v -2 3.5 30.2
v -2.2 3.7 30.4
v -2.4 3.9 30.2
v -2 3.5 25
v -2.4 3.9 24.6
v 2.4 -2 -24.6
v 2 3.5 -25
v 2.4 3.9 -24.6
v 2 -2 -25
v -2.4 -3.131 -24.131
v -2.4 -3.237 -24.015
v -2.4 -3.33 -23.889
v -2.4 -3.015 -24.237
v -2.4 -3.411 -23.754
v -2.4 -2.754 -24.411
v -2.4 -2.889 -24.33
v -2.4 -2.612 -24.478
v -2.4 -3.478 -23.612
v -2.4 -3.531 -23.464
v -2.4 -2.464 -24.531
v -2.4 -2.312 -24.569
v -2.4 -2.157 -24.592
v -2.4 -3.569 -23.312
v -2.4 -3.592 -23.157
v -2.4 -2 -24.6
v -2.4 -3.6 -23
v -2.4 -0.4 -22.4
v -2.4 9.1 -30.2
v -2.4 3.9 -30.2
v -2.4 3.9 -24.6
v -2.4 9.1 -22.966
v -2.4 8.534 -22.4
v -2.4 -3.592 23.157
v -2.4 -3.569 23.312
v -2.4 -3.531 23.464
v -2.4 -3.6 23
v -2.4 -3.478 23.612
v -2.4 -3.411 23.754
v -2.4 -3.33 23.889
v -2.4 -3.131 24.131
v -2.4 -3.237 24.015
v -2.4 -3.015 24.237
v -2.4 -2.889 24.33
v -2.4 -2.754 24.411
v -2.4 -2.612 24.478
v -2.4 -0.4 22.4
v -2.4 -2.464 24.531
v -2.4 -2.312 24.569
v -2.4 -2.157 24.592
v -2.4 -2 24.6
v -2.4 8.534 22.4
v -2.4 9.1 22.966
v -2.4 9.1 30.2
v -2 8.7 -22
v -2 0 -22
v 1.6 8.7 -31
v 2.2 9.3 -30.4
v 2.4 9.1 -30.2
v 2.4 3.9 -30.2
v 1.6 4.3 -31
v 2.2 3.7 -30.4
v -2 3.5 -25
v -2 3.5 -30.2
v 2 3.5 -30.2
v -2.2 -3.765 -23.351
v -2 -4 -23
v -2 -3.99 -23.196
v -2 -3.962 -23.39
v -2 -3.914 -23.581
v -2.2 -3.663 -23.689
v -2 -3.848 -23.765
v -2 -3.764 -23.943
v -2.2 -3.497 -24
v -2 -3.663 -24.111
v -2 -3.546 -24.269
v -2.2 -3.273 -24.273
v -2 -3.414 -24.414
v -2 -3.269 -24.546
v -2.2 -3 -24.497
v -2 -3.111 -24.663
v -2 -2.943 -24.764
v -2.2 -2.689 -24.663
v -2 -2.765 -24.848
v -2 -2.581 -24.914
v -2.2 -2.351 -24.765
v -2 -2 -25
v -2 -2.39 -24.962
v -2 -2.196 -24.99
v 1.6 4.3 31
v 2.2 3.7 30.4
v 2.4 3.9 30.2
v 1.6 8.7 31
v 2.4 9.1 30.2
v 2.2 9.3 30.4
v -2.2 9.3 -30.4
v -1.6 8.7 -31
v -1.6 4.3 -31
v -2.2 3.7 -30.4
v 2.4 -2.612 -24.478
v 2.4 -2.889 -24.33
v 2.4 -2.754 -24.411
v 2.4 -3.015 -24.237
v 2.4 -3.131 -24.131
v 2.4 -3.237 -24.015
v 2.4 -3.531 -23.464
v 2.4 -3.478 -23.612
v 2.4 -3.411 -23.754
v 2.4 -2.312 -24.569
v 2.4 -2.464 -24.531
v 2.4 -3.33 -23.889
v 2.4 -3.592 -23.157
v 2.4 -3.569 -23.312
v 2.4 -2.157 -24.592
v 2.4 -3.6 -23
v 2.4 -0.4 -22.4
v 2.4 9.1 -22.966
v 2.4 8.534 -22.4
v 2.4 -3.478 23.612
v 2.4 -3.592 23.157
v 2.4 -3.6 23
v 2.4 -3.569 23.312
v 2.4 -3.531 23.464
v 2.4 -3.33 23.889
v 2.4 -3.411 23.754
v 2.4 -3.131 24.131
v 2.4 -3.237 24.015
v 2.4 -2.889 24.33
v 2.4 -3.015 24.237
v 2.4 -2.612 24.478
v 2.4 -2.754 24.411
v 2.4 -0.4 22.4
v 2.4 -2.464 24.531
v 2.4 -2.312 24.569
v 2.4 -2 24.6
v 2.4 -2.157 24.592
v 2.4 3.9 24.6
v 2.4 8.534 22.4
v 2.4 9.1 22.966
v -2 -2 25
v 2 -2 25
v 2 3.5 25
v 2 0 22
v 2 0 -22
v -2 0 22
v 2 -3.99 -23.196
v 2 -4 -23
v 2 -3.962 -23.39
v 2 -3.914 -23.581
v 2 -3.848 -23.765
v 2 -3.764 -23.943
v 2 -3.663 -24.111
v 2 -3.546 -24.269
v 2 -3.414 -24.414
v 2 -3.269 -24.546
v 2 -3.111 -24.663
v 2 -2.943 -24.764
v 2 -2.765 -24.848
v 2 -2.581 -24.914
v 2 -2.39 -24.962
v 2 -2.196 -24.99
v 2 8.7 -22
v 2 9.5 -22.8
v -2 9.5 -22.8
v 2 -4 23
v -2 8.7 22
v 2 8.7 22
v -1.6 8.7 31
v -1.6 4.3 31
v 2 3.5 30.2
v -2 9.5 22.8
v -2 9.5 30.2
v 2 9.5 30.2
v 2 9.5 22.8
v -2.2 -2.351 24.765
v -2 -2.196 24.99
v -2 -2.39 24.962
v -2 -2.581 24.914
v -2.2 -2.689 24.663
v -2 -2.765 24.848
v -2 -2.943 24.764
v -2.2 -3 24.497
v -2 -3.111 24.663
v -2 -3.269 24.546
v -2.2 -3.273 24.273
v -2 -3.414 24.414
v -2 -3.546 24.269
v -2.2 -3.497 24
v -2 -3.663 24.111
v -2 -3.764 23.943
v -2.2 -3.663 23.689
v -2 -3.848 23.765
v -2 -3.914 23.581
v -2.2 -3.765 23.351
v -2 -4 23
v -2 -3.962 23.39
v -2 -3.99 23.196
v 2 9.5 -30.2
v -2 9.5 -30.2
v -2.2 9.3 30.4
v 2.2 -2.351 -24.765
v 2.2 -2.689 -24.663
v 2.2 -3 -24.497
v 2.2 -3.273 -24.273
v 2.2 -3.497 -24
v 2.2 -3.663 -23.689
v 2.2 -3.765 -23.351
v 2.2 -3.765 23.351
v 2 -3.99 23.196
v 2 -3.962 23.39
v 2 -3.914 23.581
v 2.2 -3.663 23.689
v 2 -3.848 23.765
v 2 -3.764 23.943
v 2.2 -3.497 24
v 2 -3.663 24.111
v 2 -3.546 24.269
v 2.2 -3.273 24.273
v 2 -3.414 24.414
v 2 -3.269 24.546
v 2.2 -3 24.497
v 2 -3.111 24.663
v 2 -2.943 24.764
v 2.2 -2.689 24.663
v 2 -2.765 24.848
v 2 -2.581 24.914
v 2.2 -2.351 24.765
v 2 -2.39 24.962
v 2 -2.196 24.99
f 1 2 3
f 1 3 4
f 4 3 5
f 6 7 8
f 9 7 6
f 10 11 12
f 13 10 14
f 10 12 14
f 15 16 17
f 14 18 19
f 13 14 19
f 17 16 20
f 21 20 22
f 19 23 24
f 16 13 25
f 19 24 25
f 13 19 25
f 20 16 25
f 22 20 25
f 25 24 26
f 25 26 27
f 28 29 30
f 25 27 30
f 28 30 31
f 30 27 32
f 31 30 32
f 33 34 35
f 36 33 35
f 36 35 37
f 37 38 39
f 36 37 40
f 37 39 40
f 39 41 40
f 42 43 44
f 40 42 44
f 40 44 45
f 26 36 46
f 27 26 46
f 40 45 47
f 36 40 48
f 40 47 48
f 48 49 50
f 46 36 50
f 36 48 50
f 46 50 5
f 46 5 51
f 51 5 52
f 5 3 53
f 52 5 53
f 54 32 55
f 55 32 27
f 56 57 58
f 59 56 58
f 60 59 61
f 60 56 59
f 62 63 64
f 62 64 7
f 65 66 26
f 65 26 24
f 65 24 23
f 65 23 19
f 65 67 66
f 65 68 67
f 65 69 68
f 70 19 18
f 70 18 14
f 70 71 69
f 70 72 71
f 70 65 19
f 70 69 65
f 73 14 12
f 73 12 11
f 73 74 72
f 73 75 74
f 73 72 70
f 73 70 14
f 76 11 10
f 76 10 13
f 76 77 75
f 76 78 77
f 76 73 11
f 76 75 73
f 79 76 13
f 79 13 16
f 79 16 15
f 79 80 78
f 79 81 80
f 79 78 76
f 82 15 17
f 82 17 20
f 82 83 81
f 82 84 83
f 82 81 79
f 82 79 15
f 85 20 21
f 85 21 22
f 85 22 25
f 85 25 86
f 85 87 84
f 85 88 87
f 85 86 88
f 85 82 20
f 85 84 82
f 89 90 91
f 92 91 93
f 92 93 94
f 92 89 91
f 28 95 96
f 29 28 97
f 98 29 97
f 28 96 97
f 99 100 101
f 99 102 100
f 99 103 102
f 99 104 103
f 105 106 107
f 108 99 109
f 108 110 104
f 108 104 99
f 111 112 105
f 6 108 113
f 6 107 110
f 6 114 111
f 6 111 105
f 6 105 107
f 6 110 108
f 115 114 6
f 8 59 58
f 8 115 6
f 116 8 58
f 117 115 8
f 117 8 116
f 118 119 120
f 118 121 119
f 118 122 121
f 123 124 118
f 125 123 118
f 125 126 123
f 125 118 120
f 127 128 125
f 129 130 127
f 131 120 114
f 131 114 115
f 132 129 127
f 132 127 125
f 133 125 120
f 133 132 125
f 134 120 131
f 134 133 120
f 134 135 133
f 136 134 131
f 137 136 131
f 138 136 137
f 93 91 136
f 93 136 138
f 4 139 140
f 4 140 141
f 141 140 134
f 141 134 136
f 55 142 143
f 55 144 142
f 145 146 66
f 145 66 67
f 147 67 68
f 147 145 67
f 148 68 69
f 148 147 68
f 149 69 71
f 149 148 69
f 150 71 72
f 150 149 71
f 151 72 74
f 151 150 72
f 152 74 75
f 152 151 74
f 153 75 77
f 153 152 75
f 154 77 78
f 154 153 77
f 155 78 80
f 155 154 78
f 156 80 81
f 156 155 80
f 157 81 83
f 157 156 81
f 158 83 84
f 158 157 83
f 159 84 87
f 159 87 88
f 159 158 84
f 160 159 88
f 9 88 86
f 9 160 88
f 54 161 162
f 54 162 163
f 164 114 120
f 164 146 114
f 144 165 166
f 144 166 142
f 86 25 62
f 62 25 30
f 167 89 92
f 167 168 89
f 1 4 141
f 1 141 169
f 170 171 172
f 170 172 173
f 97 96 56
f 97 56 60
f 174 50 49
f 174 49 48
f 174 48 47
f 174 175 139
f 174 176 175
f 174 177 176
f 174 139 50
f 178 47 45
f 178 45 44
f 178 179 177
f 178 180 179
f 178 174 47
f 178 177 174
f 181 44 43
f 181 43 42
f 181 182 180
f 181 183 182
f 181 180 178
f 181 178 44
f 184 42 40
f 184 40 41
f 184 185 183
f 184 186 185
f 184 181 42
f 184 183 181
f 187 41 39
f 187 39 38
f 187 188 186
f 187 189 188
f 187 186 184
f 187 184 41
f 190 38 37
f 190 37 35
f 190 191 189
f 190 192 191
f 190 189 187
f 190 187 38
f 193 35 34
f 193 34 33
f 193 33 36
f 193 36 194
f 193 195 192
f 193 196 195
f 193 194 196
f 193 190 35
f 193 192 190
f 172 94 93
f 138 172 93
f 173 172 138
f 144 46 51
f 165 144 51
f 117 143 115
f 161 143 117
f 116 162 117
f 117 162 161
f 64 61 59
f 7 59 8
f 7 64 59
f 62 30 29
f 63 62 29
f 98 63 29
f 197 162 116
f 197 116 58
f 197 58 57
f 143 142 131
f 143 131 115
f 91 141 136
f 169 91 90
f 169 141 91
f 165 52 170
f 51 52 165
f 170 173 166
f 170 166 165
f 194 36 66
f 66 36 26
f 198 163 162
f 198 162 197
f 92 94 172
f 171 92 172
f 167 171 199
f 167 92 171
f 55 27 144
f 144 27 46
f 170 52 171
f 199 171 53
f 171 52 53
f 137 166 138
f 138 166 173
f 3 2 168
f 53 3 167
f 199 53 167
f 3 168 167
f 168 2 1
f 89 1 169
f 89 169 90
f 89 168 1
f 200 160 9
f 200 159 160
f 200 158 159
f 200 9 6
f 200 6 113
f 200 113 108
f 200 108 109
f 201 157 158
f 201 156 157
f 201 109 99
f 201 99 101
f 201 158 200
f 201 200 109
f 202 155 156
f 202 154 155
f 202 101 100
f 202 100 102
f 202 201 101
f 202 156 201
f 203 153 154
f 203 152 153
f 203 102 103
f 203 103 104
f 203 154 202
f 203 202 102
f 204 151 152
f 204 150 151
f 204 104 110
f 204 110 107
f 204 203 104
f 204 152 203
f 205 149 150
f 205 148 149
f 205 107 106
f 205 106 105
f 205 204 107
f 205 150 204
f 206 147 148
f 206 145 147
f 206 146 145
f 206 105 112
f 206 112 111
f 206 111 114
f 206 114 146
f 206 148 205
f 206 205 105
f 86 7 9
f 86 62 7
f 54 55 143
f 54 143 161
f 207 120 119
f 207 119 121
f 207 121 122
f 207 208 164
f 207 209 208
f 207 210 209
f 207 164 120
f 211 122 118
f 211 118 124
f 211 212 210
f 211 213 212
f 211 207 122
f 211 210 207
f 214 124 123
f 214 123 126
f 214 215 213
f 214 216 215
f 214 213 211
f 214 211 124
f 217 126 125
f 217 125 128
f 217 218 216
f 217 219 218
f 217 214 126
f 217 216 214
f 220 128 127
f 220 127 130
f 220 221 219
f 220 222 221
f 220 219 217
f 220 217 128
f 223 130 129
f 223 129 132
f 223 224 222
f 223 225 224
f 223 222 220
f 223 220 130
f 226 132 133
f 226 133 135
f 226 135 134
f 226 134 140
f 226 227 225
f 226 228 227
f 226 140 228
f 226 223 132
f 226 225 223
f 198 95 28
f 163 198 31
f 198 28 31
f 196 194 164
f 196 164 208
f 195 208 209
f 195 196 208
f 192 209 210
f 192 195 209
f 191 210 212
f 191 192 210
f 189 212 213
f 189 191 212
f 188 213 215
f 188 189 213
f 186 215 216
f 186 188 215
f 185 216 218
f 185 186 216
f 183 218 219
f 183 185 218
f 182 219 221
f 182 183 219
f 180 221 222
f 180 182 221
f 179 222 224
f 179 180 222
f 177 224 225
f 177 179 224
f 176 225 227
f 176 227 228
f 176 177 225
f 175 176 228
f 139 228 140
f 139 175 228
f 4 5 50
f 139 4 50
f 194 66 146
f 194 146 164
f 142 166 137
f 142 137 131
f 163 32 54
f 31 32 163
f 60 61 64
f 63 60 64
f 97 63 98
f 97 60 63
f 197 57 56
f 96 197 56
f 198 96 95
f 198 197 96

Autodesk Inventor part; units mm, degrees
ref_plane "YZ Plane" through (0, 0, 0) normal (1, 0, 0) x (0, 1, 0)
ref_plane "XZ Plane" through (0, 0, 0) normal (0, 1, 0) x (-1, 0, 0)
ref_plane "XY Plane" through (0, 0, 0) normal (0, 0, 1) x (1, 0, 0)
sketch "スケッチ1" plane through (0, 0, 0) normal (1, 0, 0) x (0, 1, 0)
  line L0 (-6.7, 0) -> (12.2, 0) projected
  line L1 (0, 43.4) -> (0, -43.4) projected
  line L2 (0, 22) -> (0, -22)
  line L3 (0, -22) -> (9.5, -22)
  line L4 (9.5, -22) -> (9.5, -31)
  line L5 (9.5, -31) -> (3.5, -31)
  line L6 (3.5, -31) -> (3.5, -25)
  line L7 (3.5, -25) -> (-4, -25)
  line L8 (-4, -25) -> (-4, 25)
  line L9 (-4, 25) -> (3.5, 25)
  line L10 (3.5, 25) -> (3.5, 31)
  line L11 (3.5, 31) -> (9.5, 31)
  line L12 (9.5, 31) -> (9.5, 22)
  line L13 (9.5, 22) -> (0, 22)
  point P0 (0, 0)
  dimension "d0" = 3.5
  dimension "d1" = 4
  dimension "d2" = 50
  dimension "d3" = 6
  dimension "d4" = 3
  dimension "d5" = 6
extrude "押し出し1" add sketch "スケッチ1" along normal mid plane 4.8
chamfer "面取り1" distance 0.8 angle 45 10 edges at (0, 9.5, 31) (0, 3.5, 31) (2.4, 6.5, 31) (-2.4, 6.5, 31) (2.4, 6.5, -31) (0, 9.5, -31) (-2.4, 6.5, -31) (0, 3.5, -31) (0, 9.5, 22) (0, 9.5, -22)
fillet "フィレット1" radius 2 2 edges at (0, -4, 25) (0, -4, -25)
chamfer "面取り2" distance 0.4 angle 45 28 edges at (2.4, -4, 0) (2.4, -3.4142, -24.4142) (2.4, 0.75, -25) (2.4, 3.5, -27.6) (2.4, -3.4142, 24.4142) (2.4, 0.75, 25) (2.4, 3.5, 27.6) (-2.4, 0.75, 25) (-2.4, -3.4142, 24.4142) (-2.4, 3.5, 27.6) (-2.4, -4, 0) (-2.4, -3.4142, -24.4142) (-2.4, 0.75, -25) (-2.4, 3.5, -27.6) (2.4, 0, 0) (-2.4, 0, 0) (2.4, 4.35, -22) (2.4, 9.1, -22.4) (2.4, 9.5, -26.5) (-2.4, 9.5, -26.5) (-2.4, 9.1, -22.4) (-2.4, 4.35, -22) (-2.4, 4.35, 22) (-2.4, 9.1, 22.4) (-2.4, 9.5, 26.5) (2.4, 9.5, 26.5) (2.4, 9.1, 22.4) (2.4, 4.35, 22)
properties part number "TrussCC_S1" material "ABS プラスチック"
